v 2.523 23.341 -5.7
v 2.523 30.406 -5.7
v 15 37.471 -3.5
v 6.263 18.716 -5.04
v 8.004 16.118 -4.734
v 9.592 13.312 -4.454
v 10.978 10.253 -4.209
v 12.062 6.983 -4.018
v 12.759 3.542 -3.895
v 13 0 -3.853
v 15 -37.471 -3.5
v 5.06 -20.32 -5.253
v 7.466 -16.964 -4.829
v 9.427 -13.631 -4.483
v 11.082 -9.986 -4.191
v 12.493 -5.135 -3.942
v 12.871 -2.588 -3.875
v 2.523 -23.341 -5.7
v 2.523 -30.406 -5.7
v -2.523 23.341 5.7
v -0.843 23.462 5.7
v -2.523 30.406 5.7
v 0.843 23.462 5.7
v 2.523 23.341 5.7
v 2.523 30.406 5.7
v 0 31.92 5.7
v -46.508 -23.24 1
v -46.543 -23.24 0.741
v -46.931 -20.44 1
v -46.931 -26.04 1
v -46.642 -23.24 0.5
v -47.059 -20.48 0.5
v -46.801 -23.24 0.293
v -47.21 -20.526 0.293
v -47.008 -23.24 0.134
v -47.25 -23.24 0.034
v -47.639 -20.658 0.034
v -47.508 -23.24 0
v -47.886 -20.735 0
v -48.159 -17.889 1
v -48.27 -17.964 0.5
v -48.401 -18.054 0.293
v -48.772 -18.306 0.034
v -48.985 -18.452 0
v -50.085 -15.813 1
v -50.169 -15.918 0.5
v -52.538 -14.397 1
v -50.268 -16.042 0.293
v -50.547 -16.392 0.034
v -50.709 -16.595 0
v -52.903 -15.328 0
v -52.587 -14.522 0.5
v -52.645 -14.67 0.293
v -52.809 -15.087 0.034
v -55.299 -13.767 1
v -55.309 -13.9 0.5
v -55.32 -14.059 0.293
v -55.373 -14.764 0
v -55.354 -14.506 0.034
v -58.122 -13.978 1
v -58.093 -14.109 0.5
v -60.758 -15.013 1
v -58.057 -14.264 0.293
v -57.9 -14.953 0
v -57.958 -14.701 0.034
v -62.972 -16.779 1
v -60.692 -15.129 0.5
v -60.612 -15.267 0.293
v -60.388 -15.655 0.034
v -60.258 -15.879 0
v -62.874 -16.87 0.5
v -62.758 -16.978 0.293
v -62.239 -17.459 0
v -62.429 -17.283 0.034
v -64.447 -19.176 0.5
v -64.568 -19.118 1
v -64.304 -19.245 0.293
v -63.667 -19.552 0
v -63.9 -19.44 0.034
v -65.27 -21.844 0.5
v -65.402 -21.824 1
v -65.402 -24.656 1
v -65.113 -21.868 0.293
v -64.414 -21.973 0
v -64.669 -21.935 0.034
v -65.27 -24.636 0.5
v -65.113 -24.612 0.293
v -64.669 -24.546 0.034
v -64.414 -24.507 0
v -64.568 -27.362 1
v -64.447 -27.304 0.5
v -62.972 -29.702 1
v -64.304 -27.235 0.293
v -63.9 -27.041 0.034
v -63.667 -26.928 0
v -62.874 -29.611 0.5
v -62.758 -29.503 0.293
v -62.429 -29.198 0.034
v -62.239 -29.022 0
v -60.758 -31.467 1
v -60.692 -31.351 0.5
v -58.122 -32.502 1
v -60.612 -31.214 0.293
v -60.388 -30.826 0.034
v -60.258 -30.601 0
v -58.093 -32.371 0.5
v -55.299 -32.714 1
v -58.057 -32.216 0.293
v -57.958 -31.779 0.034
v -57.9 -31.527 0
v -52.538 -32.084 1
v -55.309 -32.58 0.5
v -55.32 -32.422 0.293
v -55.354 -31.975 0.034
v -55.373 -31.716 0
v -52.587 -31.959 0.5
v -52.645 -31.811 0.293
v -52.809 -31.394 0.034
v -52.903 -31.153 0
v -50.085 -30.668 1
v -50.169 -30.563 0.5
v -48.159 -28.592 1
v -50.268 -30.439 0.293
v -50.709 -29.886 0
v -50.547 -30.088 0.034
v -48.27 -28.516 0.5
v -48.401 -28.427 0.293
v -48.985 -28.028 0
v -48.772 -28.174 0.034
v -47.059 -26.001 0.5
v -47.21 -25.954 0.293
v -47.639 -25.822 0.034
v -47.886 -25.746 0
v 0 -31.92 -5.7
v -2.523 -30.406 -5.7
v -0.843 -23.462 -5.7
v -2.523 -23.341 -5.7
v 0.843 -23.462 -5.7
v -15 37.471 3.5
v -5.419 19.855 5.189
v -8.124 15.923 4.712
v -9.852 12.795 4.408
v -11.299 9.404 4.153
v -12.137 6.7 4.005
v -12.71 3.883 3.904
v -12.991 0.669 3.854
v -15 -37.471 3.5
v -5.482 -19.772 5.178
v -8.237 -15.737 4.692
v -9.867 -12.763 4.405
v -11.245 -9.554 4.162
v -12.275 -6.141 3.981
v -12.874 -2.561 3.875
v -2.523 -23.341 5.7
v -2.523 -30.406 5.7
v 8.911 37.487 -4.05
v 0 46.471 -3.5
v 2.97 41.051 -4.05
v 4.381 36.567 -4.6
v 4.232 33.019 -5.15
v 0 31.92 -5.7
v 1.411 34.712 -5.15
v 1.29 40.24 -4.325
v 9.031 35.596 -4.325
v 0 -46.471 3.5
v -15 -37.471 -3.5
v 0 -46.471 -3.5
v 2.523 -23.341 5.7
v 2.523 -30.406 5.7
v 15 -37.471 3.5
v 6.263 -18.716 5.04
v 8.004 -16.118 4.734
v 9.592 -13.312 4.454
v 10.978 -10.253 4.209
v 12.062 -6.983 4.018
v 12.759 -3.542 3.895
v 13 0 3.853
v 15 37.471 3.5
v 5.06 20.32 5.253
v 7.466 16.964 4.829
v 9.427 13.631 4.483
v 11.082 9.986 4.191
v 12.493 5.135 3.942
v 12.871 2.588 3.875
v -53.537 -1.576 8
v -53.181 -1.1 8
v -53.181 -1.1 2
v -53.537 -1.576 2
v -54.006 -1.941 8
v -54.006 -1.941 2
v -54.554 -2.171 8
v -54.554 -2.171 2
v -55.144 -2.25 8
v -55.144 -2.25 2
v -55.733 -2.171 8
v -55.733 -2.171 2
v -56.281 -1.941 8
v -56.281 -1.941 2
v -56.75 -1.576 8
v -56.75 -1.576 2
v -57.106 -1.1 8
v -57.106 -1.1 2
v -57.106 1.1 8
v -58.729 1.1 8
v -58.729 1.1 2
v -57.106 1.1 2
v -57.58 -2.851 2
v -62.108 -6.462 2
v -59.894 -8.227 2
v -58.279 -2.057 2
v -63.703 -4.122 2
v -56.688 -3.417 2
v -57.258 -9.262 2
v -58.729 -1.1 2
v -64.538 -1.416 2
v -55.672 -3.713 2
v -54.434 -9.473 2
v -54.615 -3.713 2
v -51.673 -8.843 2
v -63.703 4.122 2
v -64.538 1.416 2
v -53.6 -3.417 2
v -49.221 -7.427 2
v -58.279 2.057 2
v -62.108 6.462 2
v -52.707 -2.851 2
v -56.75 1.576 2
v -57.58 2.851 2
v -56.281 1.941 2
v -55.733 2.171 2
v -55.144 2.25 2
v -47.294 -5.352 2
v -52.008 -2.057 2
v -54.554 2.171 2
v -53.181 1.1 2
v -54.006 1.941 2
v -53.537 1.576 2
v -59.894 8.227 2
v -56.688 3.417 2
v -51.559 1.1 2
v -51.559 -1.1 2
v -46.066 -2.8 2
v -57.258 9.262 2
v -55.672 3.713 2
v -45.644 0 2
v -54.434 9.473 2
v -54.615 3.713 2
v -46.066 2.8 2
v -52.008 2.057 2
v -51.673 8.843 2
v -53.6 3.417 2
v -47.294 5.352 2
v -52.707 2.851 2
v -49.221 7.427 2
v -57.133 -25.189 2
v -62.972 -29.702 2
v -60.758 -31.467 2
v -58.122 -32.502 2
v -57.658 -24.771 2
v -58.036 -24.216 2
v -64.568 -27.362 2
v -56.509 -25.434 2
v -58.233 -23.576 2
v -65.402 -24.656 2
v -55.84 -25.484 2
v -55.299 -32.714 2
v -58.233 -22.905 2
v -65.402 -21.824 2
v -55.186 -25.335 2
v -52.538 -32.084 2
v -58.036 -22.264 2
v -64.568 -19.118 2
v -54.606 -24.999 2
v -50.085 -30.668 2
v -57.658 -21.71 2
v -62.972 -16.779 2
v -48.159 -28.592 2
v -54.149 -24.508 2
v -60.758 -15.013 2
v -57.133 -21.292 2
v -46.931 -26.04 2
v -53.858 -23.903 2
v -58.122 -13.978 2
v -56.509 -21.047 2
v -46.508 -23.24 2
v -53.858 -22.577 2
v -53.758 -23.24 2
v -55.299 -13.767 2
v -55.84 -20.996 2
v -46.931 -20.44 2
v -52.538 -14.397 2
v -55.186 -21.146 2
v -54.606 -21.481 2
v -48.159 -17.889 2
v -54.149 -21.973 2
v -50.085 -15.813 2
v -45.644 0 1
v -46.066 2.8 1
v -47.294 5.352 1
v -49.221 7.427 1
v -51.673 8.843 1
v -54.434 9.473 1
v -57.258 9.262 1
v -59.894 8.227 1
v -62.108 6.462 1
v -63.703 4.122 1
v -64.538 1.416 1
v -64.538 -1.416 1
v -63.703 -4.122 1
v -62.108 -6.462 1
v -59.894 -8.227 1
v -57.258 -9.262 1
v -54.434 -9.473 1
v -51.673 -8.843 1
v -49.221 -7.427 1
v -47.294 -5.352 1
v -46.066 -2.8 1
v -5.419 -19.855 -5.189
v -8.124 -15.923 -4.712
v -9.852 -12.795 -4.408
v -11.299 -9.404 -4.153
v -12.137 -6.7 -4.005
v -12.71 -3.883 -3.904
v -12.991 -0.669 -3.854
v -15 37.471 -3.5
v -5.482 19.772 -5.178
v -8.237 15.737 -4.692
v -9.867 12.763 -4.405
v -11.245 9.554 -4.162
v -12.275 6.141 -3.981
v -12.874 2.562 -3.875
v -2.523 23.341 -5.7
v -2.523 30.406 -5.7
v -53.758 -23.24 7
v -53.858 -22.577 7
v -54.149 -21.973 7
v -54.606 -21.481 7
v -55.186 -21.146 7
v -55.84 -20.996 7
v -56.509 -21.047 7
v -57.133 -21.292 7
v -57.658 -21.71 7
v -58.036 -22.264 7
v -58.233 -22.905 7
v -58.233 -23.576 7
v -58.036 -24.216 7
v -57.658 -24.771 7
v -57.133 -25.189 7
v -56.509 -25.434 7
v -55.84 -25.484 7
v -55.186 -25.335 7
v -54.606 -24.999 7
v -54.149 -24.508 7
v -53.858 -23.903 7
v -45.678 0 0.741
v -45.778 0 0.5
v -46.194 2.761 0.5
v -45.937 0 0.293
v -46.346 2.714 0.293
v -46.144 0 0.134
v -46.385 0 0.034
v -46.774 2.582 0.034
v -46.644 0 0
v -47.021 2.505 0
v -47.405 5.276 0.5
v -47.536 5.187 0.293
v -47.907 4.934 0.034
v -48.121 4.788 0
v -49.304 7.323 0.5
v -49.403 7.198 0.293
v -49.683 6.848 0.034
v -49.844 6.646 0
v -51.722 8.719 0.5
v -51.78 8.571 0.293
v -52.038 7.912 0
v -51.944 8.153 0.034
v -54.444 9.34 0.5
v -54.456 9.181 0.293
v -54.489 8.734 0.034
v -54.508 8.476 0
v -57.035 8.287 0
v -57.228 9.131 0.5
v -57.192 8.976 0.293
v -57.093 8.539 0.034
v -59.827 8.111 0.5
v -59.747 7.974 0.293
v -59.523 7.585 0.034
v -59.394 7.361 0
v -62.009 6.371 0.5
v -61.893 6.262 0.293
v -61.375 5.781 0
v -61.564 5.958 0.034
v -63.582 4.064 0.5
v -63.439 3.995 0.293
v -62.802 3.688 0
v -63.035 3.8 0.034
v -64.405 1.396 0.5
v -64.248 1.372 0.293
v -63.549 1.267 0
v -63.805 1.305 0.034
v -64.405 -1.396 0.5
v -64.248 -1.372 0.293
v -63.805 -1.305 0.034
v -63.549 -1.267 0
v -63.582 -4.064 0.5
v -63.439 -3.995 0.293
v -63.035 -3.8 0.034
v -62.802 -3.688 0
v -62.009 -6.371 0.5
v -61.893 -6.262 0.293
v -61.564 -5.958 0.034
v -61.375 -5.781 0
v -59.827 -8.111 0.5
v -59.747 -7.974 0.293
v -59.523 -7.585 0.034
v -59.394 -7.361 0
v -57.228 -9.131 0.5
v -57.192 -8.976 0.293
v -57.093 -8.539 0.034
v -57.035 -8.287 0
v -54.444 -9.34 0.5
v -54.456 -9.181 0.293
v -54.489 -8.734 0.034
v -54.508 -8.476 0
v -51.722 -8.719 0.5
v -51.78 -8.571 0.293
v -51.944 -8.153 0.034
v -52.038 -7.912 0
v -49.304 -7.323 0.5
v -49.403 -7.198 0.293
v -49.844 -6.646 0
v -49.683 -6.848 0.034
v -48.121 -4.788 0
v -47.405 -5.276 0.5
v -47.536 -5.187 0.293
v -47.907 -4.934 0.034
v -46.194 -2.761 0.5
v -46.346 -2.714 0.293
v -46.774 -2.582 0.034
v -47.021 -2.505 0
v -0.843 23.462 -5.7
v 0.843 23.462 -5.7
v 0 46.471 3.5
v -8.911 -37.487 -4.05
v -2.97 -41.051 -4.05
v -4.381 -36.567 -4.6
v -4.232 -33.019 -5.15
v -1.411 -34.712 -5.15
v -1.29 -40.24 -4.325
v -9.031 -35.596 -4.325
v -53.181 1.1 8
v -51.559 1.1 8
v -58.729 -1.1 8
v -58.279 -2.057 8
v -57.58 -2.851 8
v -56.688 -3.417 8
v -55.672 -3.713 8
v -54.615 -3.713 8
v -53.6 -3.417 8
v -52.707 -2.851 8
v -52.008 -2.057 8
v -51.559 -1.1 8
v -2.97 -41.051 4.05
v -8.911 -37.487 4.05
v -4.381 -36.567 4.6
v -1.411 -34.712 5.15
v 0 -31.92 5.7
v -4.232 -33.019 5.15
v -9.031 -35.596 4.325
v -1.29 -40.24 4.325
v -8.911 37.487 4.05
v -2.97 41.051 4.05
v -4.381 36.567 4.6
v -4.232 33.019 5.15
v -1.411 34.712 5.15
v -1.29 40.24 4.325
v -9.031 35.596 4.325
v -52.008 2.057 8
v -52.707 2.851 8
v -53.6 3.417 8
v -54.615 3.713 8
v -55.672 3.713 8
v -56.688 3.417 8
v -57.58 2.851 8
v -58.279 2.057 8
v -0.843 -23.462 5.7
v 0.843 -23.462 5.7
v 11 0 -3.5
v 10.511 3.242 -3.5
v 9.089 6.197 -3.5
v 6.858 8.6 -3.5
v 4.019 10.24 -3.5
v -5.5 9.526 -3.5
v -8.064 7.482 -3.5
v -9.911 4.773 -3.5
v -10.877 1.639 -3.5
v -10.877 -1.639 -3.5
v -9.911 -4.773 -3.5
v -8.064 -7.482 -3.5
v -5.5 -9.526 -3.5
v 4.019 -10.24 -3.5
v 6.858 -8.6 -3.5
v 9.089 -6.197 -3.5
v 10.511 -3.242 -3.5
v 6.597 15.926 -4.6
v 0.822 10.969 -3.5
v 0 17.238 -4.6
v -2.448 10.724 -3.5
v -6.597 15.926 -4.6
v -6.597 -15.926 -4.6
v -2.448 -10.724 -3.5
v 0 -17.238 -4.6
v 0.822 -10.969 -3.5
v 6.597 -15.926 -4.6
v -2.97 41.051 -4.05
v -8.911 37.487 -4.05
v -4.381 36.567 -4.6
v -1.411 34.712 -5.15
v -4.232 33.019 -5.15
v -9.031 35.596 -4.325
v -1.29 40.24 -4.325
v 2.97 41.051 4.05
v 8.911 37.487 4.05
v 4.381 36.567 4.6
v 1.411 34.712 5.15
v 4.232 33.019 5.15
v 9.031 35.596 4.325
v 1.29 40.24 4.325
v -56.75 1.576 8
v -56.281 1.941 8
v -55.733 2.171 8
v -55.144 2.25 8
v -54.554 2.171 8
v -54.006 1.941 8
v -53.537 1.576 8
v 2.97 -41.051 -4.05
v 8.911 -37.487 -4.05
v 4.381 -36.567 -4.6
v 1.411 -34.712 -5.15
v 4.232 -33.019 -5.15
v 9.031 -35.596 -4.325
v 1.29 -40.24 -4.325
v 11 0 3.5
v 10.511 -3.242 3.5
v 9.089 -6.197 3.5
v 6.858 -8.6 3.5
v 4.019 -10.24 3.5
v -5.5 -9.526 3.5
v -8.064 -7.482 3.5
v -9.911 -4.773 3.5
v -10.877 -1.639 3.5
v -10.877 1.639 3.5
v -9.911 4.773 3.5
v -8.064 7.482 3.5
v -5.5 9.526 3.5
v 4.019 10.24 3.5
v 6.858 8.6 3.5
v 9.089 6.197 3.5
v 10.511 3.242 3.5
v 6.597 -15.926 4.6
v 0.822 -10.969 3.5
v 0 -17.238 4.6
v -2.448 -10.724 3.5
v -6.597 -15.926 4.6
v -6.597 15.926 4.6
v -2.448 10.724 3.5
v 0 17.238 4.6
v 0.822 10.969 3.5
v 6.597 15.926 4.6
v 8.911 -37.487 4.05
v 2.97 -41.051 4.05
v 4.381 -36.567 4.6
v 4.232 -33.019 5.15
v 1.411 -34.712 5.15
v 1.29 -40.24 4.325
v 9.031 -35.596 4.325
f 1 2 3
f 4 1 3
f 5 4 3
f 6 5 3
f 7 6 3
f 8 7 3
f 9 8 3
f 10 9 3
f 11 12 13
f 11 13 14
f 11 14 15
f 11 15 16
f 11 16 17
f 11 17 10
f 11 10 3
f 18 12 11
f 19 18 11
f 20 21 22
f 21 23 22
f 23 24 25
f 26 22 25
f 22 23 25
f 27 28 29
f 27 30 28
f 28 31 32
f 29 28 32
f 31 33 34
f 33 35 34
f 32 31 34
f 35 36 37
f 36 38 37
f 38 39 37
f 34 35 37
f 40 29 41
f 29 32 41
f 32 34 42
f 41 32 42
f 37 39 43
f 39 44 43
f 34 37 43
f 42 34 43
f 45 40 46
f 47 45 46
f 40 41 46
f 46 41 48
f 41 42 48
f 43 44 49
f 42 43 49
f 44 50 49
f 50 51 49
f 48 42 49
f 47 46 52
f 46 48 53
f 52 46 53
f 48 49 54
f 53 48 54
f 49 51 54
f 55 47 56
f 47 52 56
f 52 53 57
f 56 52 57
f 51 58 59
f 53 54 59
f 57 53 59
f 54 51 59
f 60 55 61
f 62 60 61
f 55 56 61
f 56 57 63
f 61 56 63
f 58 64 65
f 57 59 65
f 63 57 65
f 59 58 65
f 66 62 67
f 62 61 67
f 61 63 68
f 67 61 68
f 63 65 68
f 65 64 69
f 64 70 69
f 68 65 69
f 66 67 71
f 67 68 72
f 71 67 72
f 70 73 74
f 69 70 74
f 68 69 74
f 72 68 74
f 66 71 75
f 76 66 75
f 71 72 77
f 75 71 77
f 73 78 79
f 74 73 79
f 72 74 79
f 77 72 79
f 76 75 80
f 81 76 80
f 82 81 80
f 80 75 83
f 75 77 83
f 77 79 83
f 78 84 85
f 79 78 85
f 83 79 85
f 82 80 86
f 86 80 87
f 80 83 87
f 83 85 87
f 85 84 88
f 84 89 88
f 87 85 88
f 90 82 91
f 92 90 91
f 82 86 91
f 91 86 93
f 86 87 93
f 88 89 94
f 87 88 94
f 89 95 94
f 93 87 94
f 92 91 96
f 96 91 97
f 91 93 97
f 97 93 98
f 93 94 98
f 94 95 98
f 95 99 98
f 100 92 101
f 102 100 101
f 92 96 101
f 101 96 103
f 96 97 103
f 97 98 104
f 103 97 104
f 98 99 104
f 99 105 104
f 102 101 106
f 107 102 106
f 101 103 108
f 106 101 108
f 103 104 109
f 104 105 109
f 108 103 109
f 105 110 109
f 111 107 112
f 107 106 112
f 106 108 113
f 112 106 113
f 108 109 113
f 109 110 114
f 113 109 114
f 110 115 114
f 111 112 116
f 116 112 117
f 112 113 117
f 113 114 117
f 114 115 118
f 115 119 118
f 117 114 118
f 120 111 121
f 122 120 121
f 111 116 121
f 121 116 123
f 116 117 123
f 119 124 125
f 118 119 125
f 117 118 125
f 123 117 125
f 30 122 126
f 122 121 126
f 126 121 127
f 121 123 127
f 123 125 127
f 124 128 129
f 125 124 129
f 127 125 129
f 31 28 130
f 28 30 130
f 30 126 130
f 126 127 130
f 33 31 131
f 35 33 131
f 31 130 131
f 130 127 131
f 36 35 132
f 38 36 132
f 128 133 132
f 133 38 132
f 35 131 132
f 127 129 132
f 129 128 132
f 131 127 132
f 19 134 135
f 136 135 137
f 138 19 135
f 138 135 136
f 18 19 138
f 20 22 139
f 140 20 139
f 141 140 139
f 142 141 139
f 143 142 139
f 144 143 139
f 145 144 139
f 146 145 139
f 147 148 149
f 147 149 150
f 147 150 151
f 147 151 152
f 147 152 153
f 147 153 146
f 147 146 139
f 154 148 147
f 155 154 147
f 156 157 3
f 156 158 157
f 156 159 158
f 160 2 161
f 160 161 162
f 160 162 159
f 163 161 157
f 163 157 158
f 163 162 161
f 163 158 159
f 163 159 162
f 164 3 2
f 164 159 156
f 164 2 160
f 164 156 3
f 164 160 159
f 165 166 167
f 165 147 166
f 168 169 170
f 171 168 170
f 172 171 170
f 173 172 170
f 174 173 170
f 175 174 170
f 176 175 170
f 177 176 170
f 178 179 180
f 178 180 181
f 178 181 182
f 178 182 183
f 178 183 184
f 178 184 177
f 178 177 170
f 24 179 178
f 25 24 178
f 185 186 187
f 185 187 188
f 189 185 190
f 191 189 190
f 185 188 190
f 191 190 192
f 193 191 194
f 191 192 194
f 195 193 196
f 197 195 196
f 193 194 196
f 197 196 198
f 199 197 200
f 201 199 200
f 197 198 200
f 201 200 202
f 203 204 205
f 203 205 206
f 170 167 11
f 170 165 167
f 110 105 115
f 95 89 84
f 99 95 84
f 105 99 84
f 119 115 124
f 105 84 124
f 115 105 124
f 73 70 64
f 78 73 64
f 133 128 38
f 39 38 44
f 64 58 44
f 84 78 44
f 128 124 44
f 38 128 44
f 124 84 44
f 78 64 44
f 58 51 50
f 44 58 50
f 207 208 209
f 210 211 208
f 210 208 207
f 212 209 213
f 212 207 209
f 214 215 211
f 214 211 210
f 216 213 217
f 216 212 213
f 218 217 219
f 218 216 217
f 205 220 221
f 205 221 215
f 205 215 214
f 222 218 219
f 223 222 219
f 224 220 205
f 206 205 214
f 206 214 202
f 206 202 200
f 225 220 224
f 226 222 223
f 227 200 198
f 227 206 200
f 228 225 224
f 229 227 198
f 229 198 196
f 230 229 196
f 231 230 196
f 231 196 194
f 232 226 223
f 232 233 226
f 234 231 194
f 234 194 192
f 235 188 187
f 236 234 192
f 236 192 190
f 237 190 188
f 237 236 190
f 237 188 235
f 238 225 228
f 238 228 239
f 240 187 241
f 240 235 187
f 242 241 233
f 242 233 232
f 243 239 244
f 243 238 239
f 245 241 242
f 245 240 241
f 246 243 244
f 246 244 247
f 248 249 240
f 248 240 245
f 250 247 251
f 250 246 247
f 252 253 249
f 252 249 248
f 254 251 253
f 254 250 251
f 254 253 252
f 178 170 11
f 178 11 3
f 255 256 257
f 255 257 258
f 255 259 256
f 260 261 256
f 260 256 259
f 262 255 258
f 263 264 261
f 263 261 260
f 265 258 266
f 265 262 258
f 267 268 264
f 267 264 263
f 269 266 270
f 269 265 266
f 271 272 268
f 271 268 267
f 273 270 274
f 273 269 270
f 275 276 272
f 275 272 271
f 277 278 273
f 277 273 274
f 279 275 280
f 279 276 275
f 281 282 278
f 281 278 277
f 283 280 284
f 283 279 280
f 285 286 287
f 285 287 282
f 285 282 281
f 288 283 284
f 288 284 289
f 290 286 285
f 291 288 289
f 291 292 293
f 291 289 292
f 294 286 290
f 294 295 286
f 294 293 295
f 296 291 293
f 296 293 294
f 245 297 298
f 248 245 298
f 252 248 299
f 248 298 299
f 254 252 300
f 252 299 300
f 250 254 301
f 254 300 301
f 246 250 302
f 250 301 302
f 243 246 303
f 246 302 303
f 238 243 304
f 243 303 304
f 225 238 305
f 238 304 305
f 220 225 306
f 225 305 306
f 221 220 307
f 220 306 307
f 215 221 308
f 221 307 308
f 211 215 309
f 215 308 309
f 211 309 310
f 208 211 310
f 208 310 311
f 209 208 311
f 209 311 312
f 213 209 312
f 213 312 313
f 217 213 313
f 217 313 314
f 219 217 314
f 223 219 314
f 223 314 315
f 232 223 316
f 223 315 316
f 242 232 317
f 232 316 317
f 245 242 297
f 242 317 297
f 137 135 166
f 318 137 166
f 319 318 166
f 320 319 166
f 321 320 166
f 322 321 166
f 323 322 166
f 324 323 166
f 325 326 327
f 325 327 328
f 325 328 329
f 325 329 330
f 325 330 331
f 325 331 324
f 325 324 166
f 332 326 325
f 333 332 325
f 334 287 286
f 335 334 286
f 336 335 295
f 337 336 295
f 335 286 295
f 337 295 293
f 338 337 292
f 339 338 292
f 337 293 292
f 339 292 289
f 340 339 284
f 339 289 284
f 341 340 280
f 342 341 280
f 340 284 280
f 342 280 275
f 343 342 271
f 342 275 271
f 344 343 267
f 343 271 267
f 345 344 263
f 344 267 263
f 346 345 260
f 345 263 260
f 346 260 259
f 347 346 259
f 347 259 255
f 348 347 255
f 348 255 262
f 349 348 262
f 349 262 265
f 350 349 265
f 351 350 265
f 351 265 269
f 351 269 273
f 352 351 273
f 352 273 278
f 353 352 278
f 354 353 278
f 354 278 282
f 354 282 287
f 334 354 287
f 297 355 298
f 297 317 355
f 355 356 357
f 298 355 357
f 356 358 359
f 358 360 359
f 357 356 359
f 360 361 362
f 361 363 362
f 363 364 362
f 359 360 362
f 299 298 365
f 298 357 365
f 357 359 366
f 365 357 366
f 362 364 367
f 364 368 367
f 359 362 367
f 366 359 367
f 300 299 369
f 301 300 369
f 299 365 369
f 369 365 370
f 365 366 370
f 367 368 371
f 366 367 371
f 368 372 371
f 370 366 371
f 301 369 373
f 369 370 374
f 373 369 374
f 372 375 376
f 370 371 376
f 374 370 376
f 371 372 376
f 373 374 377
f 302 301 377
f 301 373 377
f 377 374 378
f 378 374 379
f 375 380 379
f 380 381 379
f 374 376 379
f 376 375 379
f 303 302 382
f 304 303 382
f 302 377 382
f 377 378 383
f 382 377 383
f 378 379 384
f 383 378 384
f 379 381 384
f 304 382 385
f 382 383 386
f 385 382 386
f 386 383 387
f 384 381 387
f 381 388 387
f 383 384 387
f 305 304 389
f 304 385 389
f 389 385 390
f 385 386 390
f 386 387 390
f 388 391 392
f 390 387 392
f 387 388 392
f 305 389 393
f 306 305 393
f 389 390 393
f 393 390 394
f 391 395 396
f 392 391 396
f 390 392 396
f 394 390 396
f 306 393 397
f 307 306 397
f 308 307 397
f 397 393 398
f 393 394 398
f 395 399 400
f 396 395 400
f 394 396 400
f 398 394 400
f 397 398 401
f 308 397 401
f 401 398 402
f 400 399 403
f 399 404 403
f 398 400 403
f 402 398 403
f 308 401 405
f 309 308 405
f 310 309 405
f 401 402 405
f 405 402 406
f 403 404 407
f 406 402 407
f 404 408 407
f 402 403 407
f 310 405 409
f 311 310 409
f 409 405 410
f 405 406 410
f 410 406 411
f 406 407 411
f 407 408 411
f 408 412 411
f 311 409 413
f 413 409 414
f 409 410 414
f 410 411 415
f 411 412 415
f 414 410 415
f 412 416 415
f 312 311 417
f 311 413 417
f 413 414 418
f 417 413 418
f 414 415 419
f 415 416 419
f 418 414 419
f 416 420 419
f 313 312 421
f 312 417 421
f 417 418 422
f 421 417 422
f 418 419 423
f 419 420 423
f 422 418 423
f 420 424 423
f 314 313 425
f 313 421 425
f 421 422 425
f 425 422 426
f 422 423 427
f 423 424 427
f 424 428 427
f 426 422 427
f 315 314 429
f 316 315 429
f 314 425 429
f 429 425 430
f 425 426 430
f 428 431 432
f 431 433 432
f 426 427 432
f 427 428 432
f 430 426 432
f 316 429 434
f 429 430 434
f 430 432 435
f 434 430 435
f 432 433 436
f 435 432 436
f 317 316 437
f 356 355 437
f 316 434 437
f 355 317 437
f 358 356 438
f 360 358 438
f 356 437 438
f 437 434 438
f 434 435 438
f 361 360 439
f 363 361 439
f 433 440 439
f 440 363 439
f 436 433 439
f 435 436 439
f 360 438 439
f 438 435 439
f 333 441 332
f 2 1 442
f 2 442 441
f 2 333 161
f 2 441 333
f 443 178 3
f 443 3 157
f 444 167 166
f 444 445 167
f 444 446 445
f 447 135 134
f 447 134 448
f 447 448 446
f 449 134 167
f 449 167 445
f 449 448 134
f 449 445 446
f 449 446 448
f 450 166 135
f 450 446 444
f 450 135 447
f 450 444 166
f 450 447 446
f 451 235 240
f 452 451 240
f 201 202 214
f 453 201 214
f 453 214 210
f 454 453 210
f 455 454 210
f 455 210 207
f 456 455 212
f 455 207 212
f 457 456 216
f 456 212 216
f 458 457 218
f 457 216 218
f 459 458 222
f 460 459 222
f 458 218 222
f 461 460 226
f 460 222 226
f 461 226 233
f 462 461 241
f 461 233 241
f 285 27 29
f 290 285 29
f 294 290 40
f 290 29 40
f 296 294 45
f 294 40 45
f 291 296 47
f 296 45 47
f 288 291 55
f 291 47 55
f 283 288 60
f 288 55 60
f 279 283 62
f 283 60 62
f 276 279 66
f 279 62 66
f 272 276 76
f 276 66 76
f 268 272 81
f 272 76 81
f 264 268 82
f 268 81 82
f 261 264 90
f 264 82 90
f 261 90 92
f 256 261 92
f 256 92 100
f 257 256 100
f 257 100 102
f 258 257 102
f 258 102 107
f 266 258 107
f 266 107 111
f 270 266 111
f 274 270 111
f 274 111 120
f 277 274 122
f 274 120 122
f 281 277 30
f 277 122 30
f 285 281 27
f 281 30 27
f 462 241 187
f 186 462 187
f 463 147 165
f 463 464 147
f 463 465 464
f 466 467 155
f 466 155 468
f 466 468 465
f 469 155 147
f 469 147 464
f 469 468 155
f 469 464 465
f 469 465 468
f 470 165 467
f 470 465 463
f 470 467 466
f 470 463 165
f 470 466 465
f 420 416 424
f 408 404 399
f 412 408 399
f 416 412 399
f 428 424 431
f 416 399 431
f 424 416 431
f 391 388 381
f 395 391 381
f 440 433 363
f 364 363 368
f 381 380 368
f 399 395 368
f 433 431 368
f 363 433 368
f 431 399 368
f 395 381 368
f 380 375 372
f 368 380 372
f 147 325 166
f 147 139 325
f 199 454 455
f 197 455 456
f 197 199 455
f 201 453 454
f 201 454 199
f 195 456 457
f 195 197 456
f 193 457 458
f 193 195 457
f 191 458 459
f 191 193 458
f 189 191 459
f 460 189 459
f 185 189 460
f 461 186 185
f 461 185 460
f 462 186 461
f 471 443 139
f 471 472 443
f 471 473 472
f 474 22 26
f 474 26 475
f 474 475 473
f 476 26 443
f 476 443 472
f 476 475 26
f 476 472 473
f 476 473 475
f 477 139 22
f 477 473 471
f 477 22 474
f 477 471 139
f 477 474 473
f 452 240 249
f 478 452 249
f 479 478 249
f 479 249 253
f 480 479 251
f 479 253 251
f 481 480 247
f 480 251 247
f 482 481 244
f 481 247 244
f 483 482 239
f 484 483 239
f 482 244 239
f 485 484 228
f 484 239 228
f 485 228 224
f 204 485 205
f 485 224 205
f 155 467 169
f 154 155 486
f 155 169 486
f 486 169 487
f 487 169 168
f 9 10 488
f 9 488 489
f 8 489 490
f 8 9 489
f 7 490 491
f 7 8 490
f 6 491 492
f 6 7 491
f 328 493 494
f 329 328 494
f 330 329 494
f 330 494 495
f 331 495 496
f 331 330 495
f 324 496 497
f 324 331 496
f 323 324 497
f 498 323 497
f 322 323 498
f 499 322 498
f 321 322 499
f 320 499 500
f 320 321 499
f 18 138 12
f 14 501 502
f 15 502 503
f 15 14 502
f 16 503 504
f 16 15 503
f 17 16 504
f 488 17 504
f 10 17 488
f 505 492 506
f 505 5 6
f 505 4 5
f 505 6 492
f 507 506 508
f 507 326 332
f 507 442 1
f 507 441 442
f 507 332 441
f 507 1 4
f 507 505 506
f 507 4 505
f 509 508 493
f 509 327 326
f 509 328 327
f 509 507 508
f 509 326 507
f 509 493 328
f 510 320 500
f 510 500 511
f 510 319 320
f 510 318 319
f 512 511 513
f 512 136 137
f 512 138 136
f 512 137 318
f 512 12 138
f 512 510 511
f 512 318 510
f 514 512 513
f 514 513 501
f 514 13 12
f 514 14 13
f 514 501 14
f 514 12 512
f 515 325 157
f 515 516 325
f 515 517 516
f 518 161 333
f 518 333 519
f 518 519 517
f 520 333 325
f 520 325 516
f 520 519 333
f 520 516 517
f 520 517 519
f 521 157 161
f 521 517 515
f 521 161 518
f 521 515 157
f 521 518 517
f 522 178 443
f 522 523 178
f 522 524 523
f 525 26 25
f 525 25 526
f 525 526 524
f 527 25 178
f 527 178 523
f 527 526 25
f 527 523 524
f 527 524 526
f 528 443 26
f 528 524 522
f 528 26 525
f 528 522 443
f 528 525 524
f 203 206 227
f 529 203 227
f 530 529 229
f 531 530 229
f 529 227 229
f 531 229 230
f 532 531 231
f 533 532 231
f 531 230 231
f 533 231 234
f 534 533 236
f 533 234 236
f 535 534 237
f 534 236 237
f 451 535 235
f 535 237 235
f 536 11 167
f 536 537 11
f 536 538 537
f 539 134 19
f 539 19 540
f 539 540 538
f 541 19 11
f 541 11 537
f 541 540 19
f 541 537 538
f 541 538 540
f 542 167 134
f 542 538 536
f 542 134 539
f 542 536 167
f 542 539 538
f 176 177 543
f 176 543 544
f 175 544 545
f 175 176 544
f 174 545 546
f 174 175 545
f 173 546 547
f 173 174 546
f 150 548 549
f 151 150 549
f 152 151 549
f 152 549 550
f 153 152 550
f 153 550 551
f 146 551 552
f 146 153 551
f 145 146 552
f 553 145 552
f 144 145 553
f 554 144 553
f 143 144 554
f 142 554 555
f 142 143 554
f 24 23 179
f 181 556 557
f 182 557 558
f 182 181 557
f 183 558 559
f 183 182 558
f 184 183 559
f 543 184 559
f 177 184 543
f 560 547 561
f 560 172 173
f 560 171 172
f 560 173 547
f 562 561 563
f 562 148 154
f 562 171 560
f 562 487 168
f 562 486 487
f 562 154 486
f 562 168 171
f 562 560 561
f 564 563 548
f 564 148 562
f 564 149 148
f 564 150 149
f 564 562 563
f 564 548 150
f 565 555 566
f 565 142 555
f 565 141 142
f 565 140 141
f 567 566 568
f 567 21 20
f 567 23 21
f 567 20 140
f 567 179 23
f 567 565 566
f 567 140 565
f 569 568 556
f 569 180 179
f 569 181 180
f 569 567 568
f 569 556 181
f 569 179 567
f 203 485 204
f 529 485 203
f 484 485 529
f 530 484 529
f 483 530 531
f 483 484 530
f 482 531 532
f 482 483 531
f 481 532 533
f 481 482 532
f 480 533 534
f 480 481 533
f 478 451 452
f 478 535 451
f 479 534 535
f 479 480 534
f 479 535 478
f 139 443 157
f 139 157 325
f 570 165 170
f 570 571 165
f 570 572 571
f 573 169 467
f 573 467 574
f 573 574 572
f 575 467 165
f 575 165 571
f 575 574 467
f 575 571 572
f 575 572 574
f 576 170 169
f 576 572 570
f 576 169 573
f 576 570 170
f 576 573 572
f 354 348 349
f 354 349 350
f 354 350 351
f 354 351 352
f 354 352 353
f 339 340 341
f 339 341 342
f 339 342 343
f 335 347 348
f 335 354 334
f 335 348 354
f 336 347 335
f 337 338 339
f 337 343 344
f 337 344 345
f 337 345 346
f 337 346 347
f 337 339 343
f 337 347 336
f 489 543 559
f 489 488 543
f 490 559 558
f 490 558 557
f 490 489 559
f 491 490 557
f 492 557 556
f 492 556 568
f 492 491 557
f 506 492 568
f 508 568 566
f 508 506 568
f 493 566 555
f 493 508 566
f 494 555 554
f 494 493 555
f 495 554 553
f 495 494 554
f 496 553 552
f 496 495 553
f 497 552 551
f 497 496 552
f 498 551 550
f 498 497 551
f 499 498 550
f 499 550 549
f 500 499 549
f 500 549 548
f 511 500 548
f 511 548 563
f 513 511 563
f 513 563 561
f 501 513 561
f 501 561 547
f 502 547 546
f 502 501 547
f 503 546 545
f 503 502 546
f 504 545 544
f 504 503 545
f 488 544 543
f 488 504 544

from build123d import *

# Parameters (mm, degrees)
F0_R       = 11
F1_DEPTH   = 3.5
F3_DEPTH   = 8
F2_R       = 9.5
F4_DEPTH   = 2
F5_R       = 1
F6_R       = 9.5
F6_R_2     = 2.25
F7_DEPTH   = 2
F8_DEPTH   = 7
F9_R       = 1
F1_FACE_R  = 11
F1_FACE1_R = 11
F10_DEPTH  = 2.2
F10_TAPER  = 80


# Not quite as in the source:
# - a feature names something its author has since deleted; it is built from what else it names


with BuildPart() as f1:
    # F0 (on Top) → F1 (new body, symmetric)
    with BuildSketch(Plane.XY):
        Polygon((0, -46.4706834555), (15, -37.4706834555), (15, 37.4706834555), (0, 46.4706834555), (-15, 37.4706834555), (-15, -37.4706834555), align=None)
        Circle(F0_R, mode=Mode.SUBTRACT)
    extrude(amount=F1_DEPTH, both=True)

    # F1_face (on face) + F1_face1 (on face) → F10 (join, symmetric)
    with BuildSketch(Plane.XY.offset(3.5)):
        Polygon((-15, -37.4706834555), (0, -46.4706834555), (15, -37.4706834555), (15, 37.4706834555), (0, 46.4706834555), (-15, 37.4706834555), align=None)
        Circle(F1_FACE_R, mode=Mode.SUBTRACT)
    with BuildSketch(Plane(origin=(0, 0, -3.5), x_dir=(1, 0, 0), z_dir=(0, 0, -1))):
        Polygon((0, 46.4706834555), (-15, 37.4706834555), (-15, -37.4706834555), (0, -46.4706834555), (15, -37.4706834555), (15, 37.4706834555), align=None)
        Circle(F1_FACE1_R, mode=Mode.SUBTRACT)
    extrude(amount=F10_DEPTH, both=True, taper=F10_TAPER, dir=(0, 0, 1))


with BuildPart() as f3:
    # F2 (on Top) → F3 (new body)
    with BuildSketch(Plane.XY):
        with BuildLine():
            Line((-53.1808868797, 1.1), (-51.5586271683, 1.1))
            ThreePointArc((-51.5586271683, 1.1), (-55.1436655223, 3.75), (-58.7287038764, 1.1))
            Line((-58.7287038764, 1.1), (-57.106444165, 1.1))
            ThreePointArc((-57.106444165, 1.1), (-55.1436655223, 2.25), (-53.1808868797, 1.1))
        make_face()
    extrude(amount=F3_DEPTH)



with BuildPart() as f3b:
    # F2 (on Top) → F3, piece 2 (new body)
    with BuildSketch(Plane.XY):
        with BuildLine():
            ThreePointArc((-58.7287038764, -1.1), (-55.1436655223, -3.75), (-51.5586271683, -1.1))
            Line((-51.5586271683, -1.1), (-53.1808868797, -1.1))
            ThreePointArc((-53.1808868797, -1.1), (-55.1436655223, -2.25), (-57.106444165, -1.1))
            Line((-57.106444165, -1.1), (-58.7287038764, -1.1))
        make_face()
    extrude(amount=F3_DEPTH)


with BuildPart() as f3_1:
    add(f3.part)

    add(f3b.part)  # F4 merges F3b
    # F2 (on Top) → F4 (join)
    with BuildSketch(Plane.XY):
        with Locations((-55.1436655223, 0)):
            Circle(F2_R)
        with BuildLine():
            ThreePointArc((-51.5586271683, 1.1), (-51.4351352321, 0.556150237), (-51.3936655223, 0))
            ThreePointArc((-51.3936655223, 0), (-51.4351352321, -0.556150237), (-51.5586271683, -1.1))
            ThreePointArc((-51.5586271683, -1.1), (-55.1436655223, -3.75), (-58.7287038764, -1.1))
            ThreePointArc((-58.7287038764, -1.1), (-58.8936655223, 0), (-58.7287038764, 1.1))
            ThreePointArc((-58.7287038764, 1.1), (-55.1436655223, 3.75), (-51.5586271683, 1.1))
        make_face(mode=Mode.SUBTRACT)
        with BuildLine():
            ThreePointArc((-52.8936655223, 0), (-52.9666547339, 0.5684399942), (-53.1808868797, 1.1))
            Line((-53.1808868797, 1.1), (-57.106444165, 1.1))
            ThreePointArc((-57.106444165, 1.1), (-57.3936655223, 0), (-57.106444165, -1.1))
            Line((-57.106444165, -1.1), (-53.1808868797, -1.1))
            ThreePointArc((-53.1808868797, -1.1), (-52.9666547339, -0.5684399942), (-52.8936655223, 0))
        make_face()
        with BuildLine():
            Line((-51.5586271683, -1.1), (-51.5586271683, 1.1))
            Line((-51.5586271683, 1.1), (-53.1808868797, 1.1))
            ThreePointArc((-53.1808868797, 1.1), (-52.9666547339, 0.5684399942), (-52.8936655223, 0))
            ThreePointArc((-52.8936655223, 0), (-52.9666547339, -0.5684399942), (-53.1808868797, -1.1))
            Line((-53.1808868797, -1.1), (-51.5586271683, -1.1))
        make_face()
        with BuildLine():
            Line((-57.106444165, 1.1), (-53.1808868797, 1.1))
            ThreePointArc((-53.1808868797, 1.1), (-55.1436655223, 2.25), (-57.106444165, 1.1))
        make_face()
        with BuildLine():
            ThreePointArc((-57.106444165, -1.1), (-55.1436655223, -2.25), (-53.1808868797, -1.1))
            Line((-53.1808868797, -1.1), (-57.106444165, -1.1))
        make_face()
        with BuildLine():
            Line((-58.7287038764, -1.1), (-58.7287038764, 1.1))
            ThreePointArc((-58.7287038764, 1.1), (-58.8936655223, 0), (-58.7287038764, -1.1))
        make_face()
        with BuildLine():
            Line((-57.106444165, 1.1), (-58.7287038764, 1.1))
            Line((-58.7287038764, 1.1), (-58.7287038764, -1.1))
            Line((-58.7287038764, -1.1), (-57.106444165, -1.1))
            ThreePointArc((-57.106444165, -1.1), (-57.3936655223, 0), (-57.106444165, 1.1))
        make_face()
        with BuildLine():
            ThreePointArc((-51.5586271683, -1.1), (-51.4351352321, -0.556150237), (-51.3936655223, 0))
            ThreePointArc((-51.3936655223, 0), (-51.4351352321, 0.556150237), (-51.5586271683, 1.1))
            Line((-51.5586271683, 1.1), (-51.5586271683, -1.1))
        make_face()
    extrude(amount=F4_DEPTH)

    # F5
    f5_edges = [f3_1.edges().sort_by_distance(p)[0] for p in [
        (-64.643666, 0, 0),
    ]]
    fillet(f5_edges, radius=F5_R)


with BuildPart() as f7:
    # F6 (on Top) → F7 (new body)
    with BuildSketch(Plane.XY):
        with Locations((-56.0084953904, -23.2402067631)):
            Circle(F6_R)
        with Locations((-56.0084953904, -23.2402067631)):
            Circle(F6_R_2, mode=Mode.SUBTRACT)
    extrude(amount=F7_DEPTH)

    # F6 (on Top) → F8 (join)
    with BuildSketch(Plane.XY):
        with Locations((-56.0084953904, -23.2402067631)):
            Circle(F6_R_2)
    extrude(amount=F8_DEPTH)

    # F9
    f9_edges = [f7.edges().sort_by_distance(p)[0] for p in [
        (-65.508495, -23.240207, 0),
    ]]
    fillet(f9_edges, radius=F9_R)


solid = Compound([f1.part, f3_1.part, f7.part])
